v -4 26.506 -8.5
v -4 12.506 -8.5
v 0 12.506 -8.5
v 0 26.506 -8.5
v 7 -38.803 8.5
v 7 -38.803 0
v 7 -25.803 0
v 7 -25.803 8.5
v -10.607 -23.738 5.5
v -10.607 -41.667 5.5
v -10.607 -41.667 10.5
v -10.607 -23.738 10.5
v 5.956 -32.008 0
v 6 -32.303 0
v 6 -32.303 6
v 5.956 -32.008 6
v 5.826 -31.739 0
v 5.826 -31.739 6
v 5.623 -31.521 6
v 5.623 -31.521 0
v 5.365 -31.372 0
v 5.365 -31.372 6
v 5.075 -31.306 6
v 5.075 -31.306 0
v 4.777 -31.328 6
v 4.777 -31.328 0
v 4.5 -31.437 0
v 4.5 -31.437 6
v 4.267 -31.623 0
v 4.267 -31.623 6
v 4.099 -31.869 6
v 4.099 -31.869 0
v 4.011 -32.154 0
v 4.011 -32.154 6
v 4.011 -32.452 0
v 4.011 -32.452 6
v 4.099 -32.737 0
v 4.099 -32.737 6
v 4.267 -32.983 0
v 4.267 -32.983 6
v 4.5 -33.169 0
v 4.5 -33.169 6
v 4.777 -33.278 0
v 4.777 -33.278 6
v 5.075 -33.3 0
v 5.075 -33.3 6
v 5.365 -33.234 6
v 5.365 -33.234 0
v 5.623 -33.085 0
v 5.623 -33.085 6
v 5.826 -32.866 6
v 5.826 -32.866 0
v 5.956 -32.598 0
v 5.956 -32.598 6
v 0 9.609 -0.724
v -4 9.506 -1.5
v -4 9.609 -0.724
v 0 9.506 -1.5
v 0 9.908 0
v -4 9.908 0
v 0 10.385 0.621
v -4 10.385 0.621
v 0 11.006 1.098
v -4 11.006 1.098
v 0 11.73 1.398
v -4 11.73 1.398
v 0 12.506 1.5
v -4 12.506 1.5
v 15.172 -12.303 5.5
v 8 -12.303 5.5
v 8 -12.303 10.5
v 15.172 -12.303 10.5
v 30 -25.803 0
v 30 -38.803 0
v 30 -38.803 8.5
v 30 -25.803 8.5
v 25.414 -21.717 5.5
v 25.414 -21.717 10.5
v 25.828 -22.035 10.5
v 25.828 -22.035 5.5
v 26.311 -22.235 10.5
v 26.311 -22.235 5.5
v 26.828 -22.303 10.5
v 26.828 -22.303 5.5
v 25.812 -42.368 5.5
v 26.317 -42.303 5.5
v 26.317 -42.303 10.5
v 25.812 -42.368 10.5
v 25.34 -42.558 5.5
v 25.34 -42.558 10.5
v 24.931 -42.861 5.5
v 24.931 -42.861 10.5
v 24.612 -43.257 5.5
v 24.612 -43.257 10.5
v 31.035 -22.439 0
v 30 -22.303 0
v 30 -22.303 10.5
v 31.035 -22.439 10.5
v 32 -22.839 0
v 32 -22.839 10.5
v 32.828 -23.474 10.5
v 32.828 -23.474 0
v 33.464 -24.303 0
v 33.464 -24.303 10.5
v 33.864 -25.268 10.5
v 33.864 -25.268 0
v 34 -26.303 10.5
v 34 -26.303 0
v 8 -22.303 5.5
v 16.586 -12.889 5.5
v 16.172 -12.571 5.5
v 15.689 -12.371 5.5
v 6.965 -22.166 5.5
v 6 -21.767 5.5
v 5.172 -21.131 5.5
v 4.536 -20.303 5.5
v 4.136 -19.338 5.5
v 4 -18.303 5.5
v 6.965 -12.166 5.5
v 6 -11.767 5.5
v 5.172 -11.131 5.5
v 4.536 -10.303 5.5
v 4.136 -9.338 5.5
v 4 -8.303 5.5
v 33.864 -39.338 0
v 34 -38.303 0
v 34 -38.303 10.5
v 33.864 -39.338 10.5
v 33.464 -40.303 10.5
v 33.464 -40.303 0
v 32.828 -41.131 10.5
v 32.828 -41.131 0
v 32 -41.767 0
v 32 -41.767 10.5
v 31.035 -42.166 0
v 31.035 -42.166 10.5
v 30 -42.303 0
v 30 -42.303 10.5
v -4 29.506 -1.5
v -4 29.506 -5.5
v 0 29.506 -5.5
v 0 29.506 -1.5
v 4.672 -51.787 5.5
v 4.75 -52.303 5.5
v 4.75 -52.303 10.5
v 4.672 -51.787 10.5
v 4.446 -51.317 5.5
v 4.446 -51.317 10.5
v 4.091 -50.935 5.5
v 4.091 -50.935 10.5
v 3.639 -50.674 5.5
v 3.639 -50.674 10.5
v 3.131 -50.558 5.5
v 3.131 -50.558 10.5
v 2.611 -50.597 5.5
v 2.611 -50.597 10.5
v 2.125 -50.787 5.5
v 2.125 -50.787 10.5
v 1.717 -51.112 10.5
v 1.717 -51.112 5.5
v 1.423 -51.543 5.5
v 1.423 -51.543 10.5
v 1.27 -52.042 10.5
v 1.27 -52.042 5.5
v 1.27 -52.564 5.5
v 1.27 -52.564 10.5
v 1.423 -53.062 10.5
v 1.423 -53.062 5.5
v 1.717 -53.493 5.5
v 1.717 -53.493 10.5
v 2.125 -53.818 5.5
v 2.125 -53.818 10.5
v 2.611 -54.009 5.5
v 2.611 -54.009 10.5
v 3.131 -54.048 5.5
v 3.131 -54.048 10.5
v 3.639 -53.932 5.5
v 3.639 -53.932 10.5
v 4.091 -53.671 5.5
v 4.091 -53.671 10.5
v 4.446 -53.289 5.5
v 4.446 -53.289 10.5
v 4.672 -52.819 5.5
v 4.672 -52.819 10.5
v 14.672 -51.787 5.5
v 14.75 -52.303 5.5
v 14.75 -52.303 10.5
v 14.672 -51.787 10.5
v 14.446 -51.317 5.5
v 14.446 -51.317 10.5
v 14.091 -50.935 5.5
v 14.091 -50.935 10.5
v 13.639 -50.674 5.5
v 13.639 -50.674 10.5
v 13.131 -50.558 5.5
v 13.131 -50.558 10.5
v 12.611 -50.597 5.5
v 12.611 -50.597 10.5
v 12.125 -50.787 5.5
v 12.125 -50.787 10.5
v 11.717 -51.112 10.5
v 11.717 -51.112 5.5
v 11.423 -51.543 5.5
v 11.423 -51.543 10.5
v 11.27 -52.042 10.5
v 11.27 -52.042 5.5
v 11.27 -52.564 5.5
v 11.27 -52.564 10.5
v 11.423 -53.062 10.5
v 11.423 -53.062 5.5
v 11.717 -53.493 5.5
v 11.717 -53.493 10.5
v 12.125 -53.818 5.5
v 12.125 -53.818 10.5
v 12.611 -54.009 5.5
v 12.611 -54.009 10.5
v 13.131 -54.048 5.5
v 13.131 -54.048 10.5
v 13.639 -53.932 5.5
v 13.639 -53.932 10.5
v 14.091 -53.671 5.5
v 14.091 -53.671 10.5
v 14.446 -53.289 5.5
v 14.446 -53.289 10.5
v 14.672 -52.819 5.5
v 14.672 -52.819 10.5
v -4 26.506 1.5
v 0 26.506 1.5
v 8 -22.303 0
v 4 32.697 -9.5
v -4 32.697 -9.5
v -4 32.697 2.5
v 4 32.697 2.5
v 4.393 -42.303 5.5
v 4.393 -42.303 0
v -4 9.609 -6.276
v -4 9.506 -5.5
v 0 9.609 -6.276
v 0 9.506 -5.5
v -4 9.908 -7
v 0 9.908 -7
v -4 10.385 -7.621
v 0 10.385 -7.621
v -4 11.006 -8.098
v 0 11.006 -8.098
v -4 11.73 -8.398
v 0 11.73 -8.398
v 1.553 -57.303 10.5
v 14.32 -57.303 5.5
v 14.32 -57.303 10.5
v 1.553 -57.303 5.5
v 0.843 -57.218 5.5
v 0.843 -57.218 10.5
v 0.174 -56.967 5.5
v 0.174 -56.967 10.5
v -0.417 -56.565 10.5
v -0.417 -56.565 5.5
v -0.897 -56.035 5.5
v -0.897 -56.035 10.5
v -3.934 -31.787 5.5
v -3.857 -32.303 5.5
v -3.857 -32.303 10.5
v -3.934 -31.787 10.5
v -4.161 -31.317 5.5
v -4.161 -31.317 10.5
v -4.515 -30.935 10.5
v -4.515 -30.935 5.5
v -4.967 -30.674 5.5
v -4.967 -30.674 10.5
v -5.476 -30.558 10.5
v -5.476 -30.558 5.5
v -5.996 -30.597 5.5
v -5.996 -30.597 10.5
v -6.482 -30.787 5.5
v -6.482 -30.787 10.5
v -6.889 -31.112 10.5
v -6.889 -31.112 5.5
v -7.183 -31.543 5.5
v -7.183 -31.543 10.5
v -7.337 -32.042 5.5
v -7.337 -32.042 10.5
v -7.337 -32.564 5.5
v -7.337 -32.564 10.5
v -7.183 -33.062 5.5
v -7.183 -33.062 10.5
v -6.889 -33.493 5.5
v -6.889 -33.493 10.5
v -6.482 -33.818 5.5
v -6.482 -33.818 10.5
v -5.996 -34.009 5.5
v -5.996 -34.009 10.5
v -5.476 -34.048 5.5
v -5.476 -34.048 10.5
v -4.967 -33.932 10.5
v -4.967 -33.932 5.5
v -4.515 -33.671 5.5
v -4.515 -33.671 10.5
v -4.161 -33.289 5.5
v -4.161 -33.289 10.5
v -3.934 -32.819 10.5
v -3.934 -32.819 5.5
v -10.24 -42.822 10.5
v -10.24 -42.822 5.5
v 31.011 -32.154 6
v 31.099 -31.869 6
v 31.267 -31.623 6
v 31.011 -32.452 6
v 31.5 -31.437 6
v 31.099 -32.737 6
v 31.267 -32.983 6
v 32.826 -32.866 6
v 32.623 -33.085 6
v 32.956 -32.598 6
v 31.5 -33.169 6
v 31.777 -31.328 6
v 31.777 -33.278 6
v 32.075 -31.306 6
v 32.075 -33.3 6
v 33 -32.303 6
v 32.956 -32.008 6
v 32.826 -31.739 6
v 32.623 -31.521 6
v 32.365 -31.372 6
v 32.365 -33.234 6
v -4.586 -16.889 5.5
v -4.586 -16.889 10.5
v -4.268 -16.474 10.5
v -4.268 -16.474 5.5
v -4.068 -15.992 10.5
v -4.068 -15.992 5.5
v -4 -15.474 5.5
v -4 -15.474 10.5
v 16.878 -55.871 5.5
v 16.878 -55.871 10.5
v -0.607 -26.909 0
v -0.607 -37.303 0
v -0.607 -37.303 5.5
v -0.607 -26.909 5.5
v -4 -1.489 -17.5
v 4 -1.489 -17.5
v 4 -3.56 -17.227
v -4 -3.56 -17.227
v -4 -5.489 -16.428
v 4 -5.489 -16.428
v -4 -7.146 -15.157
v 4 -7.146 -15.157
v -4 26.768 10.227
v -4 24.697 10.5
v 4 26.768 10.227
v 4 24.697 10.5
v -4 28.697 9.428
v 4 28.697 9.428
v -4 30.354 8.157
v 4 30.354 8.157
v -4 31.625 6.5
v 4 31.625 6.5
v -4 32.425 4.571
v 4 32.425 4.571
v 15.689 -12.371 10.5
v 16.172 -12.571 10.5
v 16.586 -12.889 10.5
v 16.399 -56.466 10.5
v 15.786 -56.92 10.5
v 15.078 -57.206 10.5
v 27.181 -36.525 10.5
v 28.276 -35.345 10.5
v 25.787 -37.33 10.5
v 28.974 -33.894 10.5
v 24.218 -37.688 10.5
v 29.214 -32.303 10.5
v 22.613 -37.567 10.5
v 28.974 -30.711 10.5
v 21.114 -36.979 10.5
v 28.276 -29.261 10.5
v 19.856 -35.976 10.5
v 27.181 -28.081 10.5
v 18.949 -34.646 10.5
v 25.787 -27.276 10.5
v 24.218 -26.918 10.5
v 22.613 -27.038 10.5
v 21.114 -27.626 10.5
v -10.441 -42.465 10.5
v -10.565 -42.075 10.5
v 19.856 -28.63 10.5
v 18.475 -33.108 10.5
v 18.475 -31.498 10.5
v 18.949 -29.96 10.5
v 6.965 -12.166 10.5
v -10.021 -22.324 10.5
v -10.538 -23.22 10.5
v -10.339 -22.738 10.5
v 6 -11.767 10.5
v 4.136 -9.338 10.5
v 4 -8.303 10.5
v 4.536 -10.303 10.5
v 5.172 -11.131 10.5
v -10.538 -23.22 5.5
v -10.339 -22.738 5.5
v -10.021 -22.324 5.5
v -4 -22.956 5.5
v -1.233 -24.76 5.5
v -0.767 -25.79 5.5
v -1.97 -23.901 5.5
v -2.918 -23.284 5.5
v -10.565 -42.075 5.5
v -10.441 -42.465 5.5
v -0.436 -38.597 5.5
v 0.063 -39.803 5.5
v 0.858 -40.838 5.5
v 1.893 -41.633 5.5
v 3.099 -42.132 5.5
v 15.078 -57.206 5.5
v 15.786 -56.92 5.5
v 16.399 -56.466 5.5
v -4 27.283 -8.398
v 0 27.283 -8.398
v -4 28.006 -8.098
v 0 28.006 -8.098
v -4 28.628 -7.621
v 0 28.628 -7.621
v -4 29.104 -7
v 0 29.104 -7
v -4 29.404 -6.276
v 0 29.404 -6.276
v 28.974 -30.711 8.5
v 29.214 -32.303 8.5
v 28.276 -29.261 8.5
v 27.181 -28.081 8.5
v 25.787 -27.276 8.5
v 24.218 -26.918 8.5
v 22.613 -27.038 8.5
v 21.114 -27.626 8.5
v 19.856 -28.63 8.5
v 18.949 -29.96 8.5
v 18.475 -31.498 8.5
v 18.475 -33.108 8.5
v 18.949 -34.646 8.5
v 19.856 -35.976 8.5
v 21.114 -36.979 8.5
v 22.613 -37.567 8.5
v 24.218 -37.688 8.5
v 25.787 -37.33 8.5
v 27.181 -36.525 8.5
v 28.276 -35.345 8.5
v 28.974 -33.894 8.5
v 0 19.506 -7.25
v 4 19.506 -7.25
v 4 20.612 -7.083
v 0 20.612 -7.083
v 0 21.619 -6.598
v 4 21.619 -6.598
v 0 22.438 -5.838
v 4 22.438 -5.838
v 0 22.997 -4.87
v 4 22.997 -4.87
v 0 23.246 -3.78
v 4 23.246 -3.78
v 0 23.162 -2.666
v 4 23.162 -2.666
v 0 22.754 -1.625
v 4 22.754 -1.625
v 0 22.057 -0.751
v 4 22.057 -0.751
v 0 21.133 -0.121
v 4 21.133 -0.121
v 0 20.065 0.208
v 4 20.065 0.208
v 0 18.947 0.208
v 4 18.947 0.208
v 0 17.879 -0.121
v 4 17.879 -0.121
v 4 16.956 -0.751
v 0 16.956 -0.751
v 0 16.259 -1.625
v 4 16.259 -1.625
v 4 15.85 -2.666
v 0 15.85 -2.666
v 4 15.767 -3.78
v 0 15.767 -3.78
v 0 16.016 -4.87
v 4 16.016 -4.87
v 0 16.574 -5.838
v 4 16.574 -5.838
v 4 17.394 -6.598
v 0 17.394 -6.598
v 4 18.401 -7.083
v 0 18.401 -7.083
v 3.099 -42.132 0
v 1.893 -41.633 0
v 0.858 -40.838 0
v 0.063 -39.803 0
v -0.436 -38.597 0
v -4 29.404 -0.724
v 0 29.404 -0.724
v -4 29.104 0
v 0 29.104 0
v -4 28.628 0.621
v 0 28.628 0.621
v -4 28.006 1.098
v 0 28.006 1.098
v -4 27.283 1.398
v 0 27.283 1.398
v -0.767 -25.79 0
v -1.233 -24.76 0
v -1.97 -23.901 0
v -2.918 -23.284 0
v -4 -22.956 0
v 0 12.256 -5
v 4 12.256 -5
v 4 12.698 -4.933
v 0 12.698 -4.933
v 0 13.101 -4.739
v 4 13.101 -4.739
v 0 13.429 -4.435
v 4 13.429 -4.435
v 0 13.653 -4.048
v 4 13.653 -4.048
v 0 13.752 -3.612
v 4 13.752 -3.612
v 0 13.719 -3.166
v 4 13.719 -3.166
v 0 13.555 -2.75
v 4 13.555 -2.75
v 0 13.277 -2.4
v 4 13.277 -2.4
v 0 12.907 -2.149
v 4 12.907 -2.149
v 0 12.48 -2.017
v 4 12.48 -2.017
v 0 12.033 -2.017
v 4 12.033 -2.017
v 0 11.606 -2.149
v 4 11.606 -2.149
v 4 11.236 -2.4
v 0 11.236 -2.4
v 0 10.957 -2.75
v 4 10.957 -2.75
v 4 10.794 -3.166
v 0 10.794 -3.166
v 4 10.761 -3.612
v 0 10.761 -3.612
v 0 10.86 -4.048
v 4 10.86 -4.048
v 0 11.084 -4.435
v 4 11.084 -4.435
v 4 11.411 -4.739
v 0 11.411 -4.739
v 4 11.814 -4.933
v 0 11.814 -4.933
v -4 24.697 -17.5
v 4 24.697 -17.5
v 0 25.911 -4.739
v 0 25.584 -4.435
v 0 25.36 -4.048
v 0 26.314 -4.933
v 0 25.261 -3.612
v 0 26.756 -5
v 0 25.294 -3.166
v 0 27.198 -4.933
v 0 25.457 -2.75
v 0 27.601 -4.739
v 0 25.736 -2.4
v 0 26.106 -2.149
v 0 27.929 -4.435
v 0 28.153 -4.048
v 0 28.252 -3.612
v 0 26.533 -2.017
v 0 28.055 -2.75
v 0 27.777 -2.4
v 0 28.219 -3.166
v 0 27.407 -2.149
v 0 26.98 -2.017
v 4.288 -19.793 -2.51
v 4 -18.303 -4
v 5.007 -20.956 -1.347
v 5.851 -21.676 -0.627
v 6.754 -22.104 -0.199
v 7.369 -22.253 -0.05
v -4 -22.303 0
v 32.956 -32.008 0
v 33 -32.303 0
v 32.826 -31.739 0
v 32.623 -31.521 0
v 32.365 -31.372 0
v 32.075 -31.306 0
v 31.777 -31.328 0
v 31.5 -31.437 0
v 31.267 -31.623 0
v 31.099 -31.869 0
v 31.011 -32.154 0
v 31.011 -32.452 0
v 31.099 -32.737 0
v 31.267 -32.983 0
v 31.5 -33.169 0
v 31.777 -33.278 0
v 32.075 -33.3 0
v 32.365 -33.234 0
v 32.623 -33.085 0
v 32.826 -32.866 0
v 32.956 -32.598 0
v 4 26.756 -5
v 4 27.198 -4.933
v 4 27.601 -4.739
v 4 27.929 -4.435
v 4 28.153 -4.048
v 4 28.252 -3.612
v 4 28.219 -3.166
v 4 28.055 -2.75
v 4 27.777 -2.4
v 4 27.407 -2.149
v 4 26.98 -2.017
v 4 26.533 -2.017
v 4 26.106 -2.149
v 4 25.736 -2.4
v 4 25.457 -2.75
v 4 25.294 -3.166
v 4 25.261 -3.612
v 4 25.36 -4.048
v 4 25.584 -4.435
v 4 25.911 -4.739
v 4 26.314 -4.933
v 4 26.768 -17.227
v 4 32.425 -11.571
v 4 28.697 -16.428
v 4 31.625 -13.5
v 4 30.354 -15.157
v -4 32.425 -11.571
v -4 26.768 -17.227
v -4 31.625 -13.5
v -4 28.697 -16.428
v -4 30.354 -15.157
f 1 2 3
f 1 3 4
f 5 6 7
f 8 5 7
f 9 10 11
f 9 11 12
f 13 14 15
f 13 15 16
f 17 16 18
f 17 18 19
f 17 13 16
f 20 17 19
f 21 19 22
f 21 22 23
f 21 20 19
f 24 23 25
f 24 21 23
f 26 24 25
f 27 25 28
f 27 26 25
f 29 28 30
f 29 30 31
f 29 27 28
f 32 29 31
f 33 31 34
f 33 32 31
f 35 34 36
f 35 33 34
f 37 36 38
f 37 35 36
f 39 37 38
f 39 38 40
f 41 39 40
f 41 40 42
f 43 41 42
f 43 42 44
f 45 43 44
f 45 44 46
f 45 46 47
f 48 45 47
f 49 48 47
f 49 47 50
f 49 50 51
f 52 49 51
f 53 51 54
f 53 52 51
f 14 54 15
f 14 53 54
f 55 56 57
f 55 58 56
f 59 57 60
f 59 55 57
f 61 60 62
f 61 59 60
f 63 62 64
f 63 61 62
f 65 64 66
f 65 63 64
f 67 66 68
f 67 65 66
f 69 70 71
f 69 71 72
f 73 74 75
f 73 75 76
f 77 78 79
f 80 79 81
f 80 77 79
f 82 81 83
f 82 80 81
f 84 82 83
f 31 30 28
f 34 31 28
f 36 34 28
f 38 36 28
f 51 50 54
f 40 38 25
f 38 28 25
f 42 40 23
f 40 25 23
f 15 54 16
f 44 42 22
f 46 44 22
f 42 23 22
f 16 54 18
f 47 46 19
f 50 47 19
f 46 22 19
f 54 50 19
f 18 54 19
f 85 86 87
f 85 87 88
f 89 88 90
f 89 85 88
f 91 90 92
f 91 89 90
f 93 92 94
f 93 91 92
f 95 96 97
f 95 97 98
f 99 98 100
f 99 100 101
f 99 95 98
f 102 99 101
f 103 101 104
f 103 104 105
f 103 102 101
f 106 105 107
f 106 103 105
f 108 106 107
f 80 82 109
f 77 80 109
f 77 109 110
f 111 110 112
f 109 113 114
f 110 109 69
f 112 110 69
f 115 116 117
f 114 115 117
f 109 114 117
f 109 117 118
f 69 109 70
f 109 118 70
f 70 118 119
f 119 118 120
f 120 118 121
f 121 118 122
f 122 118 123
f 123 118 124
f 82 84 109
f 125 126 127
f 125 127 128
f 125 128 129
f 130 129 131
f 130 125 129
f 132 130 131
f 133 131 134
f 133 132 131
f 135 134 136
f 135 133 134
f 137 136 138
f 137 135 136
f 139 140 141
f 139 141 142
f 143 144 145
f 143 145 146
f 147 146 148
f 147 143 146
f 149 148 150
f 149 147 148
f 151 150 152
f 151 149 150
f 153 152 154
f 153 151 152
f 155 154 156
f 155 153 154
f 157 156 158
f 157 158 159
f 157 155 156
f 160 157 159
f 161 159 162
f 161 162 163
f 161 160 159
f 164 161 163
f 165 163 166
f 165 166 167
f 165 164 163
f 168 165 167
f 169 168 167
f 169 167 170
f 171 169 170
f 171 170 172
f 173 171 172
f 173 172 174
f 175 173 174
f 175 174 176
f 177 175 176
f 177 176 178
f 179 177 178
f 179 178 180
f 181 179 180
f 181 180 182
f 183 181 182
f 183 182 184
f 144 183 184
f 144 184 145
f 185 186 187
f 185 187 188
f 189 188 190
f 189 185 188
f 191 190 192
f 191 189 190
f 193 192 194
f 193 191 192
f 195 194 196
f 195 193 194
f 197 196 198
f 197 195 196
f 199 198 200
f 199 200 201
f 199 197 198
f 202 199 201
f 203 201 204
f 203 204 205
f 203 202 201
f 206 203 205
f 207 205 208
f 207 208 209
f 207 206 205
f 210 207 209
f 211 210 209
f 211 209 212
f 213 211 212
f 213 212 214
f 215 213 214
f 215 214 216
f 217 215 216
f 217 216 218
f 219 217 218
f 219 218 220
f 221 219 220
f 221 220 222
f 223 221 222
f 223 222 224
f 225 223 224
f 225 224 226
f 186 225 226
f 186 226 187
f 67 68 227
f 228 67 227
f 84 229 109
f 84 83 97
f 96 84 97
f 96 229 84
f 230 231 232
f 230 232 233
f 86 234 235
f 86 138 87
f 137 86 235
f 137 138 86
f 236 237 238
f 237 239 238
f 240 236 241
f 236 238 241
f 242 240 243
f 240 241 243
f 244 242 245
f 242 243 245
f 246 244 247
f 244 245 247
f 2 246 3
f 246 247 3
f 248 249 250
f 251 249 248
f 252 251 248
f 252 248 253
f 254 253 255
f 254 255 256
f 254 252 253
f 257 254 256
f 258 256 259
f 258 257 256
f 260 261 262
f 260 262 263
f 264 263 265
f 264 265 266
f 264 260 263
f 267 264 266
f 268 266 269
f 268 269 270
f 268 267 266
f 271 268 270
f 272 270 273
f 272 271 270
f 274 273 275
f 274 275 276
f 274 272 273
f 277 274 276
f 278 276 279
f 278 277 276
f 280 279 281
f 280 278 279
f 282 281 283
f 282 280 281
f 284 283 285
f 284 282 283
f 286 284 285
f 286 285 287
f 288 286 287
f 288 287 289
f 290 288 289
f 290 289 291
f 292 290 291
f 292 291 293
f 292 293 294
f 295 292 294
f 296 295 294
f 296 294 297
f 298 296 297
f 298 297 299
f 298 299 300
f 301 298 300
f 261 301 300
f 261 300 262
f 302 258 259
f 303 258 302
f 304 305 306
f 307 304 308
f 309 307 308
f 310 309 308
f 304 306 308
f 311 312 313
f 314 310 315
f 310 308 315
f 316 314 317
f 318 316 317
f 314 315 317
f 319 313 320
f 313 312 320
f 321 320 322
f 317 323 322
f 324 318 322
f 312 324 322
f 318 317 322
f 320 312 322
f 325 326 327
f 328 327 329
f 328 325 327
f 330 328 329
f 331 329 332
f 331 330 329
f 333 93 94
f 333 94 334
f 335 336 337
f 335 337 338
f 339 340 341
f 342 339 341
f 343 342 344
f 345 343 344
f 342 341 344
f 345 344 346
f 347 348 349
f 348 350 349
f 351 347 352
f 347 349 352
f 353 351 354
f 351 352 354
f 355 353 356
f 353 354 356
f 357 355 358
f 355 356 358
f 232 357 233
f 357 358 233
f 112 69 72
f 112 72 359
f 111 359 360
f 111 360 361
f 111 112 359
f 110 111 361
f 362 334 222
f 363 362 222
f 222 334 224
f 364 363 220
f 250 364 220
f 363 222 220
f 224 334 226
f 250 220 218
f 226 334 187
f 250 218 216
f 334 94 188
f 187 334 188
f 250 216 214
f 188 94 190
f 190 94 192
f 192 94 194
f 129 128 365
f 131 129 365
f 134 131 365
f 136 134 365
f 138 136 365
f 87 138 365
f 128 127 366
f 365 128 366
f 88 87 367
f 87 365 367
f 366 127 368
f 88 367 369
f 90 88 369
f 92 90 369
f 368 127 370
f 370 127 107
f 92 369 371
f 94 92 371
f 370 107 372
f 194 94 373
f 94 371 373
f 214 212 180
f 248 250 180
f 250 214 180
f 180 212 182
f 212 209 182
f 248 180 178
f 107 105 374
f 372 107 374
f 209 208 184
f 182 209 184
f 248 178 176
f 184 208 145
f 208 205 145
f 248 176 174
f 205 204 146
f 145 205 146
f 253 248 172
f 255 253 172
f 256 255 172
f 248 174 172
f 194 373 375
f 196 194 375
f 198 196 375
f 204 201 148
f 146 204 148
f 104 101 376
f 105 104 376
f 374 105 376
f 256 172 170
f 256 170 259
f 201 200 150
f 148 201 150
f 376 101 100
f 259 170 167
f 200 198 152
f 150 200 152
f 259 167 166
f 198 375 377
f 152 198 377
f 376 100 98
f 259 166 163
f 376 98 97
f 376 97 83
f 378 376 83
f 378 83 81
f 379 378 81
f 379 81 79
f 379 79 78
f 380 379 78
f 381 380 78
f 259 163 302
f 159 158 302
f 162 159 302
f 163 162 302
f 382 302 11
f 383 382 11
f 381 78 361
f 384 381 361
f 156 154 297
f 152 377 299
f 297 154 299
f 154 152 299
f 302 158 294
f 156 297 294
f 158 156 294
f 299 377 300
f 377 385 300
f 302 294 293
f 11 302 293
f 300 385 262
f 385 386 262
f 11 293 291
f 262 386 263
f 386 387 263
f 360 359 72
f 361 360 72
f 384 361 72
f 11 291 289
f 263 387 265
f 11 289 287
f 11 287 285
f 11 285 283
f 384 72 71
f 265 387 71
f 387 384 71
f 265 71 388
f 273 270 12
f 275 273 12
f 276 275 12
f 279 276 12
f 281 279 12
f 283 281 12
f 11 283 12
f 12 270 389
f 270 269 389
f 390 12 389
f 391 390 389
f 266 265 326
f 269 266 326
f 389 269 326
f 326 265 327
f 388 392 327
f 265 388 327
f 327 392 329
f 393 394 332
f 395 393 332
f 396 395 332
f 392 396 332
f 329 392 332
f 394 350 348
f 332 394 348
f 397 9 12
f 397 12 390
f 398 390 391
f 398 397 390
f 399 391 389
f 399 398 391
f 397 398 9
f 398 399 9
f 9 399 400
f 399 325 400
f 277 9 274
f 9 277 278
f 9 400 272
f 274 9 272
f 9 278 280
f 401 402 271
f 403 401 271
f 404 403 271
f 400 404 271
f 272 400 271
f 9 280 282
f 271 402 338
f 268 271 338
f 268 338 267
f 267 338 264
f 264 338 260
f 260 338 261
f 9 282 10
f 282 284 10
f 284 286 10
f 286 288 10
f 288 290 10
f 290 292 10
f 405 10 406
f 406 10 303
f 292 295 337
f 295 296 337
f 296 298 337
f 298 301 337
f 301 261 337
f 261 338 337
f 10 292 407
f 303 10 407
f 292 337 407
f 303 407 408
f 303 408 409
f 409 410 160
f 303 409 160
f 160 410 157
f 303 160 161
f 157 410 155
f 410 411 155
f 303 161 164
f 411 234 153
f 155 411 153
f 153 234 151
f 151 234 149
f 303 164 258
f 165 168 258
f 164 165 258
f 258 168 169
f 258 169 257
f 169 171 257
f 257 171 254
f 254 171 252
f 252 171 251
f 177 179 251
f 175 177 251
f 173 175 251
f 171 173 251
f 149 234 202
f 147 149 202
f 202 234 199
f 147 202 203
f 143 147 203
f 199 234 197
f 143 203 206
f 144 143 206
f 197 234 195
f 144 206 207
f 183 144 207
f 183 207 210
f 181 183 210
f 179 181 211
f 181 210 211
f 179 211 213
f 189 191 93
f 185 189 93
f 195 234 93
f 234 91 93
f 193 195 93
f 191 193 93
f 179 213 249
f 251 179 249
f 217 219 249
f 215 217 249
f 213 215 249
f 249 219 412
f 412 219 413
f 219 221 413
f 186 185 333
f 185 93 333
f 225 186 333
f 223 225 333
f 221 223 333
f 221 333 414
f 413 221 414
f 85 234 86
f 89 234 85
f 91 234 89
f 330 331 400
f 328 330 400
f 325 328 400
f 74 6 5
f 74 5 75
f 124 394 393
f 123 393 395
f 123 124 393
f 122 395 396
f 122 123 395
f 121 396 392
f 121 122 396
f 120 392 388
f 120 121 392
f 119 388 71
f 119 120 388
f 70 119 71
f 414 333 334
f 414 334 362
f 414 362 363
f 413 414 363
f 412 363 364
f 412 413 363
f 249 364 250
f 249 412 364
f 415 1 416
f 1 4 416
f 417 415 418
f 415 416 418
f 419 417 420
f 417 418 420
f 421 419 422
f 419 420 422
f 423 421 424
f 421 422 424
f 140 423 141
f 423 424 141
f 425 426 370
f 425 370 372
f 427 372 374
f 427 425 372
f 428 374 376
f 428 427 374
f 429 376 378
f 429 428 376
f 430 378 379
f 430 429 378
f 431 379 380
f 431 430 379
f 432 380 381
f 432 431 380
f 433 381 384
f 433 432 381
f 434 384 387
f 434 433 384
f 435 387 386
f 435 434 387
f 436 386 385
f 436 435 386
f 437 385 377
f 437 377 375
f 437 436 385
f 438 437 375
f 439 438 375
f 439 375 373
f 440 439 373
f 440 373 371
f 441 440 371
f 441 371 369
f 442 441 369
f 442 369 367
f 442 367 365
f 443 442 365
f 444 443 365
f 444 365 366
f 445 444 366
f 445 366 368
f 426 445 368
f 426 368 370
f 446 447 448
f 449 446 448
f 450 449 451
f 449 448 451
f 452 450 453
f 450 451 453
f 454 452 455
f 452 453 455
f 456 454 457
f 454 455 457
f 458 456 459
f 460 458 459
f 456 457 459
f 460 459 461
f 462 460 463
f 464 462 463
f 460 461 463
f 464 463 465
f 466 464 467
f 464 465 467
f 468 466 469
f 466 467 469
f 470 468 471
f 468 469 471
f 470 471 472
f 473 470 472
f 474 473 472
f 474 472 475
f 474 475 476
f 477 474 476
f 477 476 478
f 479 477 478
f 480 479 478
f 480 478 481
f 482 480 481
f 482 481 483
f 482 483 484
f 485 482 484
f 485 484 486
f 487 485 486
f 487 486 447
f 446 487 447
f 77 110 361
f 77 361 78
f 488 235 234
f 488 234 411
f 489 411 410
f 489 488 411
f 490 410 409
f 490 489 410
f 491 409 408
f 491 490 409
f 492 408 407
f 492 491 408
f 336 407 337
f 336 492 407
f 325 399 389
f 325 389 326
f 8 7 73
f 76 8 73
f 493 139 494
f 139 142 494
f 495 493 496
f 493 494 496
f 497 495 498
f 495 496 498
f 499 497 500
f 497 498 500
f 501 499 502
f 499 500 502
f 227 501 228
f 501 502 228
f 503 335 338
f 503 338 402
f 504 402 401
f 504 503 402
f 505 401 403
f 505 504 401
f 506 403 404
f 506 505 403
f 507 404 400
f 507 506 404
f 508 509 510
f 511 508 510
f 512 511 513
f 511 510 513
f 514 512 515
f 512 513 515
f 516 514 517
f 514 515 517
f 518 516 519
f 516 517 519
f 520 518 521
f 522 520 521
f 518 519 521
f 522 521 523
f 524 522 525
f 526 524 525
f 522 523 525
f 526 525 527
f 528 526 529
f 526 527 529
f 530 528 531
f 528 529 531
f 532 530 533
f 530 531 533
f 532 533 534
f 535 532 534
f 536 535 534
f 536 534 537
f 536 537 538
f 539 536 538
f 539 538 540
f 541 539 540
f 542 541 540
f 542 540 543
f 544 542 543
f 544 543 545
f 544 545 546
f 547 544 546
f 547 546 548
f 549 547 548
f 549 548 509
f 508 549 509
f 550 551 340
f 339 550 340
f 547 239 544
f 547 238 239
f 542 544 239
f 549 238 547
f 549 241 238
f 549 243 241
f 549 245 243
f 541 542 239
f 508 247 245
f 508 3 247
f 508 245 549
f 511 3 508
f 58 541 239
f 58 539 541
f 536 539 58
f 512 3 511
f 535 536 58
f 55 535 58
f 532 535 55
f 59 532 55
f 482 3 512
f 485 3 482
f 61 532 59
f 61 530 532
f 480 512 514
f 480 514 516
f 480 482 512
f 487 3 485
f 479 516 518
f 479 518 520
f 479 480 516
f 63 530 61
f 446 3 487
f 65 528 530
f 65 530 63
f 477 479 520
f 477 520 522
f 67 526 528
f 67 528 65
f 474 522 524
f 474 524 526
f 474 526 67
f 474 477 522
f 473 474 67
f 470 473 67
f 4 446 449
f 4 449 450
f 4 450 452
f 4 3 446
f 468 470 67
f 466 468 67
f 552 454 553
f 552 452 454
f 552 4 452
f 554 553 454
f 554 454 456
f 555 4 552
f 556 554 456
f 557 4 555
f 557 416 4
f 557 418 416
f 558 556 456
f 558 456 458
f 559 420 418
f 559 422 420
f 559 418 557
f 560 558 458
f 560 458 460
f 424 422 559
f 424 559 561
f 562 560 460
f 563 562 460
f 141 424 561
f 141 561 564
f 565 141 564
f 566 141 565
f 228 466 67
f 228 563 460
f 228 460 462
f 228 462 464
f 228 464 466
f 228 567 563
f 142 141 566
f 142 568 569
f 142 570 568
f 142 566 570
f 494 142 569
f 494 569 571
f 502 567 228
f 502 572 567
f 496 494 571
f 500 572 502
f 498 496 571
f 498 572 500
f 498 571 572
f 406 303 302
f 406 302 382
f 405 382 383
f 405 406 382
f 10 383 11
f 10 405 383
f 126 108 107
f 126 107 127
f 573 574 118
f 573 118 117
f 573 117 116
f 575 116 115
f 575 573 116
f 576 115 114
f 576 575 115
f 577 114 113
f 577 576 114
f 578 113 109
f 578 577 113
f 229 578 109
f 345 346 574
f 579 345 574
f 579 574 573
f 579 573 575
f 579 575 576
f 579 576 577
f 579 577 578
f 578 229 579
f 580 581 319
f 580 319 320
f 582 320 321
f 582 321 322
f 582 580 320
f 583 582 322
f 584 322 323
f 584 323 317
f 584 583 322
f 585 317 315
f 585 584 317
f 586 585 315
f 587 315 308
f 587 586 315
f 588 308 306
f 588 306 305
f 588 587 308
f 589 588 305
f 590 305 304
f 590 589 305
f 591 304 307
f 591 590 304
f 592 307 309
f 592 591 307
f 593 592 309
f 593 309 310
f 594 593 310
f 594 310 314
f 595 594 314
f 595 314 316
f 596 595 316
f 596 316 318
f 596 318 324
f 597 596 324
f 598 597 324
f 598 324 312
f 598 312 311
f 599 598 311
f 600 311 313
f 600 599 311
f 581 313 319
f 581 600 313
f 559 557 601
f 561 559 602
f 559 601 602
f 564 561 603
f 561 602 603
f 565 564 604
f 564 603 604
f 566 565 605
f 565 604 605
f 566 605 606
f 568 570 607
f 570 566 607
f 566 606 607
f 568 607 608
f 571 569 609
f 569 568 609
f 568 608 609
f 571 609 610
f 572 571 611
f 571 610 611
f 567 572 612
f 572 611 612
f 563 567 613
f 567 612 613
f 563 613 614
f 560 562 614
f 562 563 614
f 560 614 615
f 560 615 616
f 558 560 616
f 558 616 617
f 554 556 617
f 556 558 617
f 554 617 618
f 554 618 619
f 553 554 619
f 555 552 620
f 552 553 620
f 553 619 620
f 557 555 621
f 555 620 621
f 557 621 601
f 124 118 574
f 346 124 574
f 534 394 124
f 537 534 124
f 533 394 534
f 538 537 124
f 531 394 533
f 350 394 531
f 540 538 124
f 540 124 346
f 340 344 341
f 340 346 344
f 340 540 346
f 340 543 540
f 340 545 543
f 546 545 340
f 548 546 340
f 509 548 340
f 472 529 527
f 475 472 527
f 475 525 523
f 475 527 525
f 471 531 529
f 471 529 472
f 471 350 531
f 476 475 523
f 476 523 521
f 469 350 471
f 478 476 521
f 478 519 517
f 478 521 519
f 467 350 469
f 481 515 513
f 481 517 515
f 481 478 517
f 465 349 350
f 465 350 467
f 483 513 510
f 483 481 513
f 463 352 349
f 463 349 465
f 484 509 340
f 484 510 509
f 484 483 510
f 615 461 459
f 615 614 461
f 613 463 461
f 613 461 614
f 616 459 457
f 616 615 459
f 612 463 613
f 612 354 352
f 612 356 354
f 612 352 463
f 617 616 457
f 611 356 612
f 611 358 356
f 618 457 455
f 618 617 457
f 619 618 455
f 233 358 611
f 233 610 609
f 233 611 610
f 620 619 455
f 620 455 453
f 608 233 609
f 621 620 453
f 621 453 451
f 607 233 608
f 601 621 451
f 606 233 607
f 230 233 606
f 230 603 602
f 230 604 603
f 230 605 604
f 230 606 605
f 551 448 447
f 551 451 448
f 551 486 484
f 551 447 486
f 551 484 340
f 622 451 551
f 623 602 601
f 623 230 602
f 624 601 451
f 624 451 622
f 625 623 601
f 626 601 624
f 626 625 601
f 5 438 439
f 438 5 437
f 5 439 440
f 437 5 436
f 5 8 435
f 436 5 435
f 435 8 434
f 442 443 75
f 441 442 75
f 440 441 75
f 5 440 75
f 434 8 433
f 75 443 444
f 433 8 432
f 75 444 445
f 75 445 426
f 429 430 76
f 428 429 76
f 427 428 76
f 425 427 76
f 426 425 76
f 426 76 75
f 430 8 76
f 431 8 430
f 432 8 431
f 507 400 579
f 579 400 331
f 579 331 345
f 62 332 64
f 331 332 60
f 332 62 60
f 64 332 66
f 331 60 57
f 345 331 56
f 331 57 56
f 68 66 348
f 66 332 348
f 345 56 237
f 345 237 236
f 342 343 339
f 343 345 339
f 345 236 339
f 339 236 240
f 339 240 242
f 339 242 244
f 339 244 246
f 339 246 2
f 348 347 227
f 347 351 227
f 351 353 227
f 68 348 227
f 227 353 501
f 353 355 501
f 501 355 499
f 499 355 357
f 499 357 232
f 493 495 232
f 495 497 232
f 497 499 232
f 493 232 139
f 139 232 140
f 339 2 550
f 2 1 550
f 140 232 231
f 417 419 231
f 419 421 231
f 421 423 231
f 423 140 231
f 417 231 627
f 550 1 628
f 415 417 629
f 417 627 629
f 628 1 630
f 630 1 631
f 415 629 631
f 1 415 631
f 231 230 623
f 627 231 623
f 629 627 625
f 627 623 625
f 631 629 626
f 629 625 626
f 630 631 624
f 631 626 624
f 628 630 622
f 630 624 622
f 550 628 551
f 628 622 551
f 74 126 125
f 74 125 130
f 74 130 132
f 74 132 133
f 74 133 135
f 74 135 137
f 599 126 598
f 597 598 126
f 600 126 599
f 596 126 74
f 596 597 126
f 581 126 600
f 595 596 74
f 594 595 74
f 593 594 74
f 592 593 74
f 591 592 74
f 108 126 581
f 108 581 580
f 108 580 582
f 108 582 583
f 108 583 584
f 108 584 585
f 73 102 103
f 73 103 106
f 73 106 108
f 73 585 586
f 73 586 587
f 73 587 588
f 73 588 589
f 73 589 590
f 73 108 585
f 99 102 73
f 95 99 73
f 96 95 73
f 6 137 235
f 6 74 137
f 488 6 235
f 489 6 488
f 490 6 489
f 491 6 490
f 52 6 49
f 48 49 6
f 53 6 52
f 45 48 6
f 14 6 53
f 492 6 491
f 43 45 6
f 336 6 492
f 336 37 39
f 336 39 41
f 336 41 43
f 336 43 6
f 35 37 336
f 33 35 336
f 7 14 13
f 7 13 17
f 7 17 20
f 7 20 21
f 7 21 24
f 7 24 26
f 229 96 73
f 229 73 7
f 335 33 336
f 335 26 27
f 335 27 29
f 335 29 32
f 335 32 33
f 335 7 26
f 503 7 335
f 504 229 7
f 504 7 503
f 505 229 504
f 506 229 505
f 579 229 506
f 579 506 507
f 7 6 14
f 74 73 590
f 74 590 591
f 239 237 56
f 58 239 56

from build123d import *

# Parameters (mm, degrees)
IZIM1_R                     = 5.4
IZIM1_R_2                   = 1.75
Y_KSEKLIK_EKSTR_ZYON1_DEPTH = 10.5
IZIM3_W                     = 5.5
IZIM3_H                     = 14
KES_EKSTR_ZYON1_DEPTH       = 34.5
KES_EKSTR_ZYON2_DEPTH       = 34.5
KES_EKSTR_ZYON2_DEPTH_BACK  = 34.5
IZIM5_W                     = 6.606601718
IZIM5_H                     = 5.5
KES_EKSTR_ZYON4_DEPTH       = 50.5
KES_EKSTR_ZYON5_DEPTH       = 5.5
Y_KSEKLIK_EKSTR_ZYON2_DEPTH = 8
RADYUS2_R                   = 8
RADYUS7_R                   = 4
IZIM9_W                     = 23
IZIM9_H                     = 13
KES_EKSTR_ZYON6_DEPTH       = 8.5
IZIM10_R                    = 1
KES_EKSTR_ZYON7_DEPTH       = 6
KES_EKSTR_ZYON8_DEPTH       = 4
IZIM12_R                    = 1.3
IZIM12_R_2                  = 2.5
KES_EKSTR_ZYON9_DEPTH       = 8
IZIM13_R                    = 2.5
Y_KSEKLIK_EKSTR_ZYON4_DEPTH = 8
IZIM14_R                    = 3.75
IZIM14_R_2                  = 1.5
KES_EKSTR_ZYON10_DEPTH      = 8
IZIM15_W                    = 10
IZIM15_H                    = 20
IZIM15_R                    = 1.5
KES_EKSTR_ZYON11_DEPTH      = 4
RADYUS10_R                  = 3
RADYUS11_R                  = 3
RADYUS12_R                  = 3
RADYUS13_R                  = 3


with BuildPart() as part:
    # Çizim1 → Yükseklik-Ekstrüzyon1 (new body)
    with BuildSketch(Plane.XY):
        with BuildLine():
            ThreePointArc((-10.23959488, -42.821815771), (-10.512642946, -42.272926126), (-10.606601718, -41.667115232))
            Line((-10.606601718, -41.667115232), (-10.606601718, -23.737818565))
            ThreePointArc((-10.606601718, -23.737818565), (-10.454360783, -22.972451701), (-10.02081528, -22.323605003))
            Line((-10.02081528, -22.323605003), (-4.585786438, -16.888576161))
            ThreePointArc((-4.585786438, -16.888576161), (-4.152240935, -16.239729463), (-4, -15.474362598))
            Line((-4, -15.474362598), (-4, -12.302789723))
            Line((-4, -12.302789723), (-4, 32.697210277))
            Line((-4, 32.697210277), (4, 32.697210277))
            Line((4, 32.697210277), (4, -8.302789723))
            ThreePointArc((4, -8.302789723), (5.171572875, -11.131216848), (8, -12.302789723))
            Line((8, -12.302789723), (15.171572875, -12.302789723))
            ThreePointArc((15.171572875, -12.302789723), (15.93693974, -12.455030658), (16.585786438, -12.888576161))
            Line((16.585786438, -12.888576161), (25.414213562, -21.717003285))
            ThreePointArc((25.414213562, -21.717003285), (26.06306026, -22.150548788), (26.828427125, -22.302789723))
            Line((26.828427125, -22.302789723), (30, -22.302789723))
            ThreePointArc((30, -22.302789723), (32.828427125, -23.474362598), (34, -26.302789723))
            Line((34, -26.302789723), (34, -38.302789723))
            ThreePointArc((34, -38.302789723), (32.828427125, -41.131216848), (30, -42.302789723))
            Line((30, -42.302789723), (26.317150887, -42.302789723))
            ThreePointArc((26.317150887, -42.302789723), (25.340138032, -42.557669131), (24.612145635, -43.257343842))
            Line((24.612145635, -43.257343842), (16.877945687, -55.870958544))
            ThreePointArc((16.877945687, -55.870958544), (15.785957092, -56.920470611), (14.320437809, -57.302789723))
            Line((14.320437809, -57.302789723), (1.552914271, -57.302789723))
            ThreePointArc((1.552914271, -57.302789723), (0.17381174, -56.967011225), (-0.896575472, -56.03484053))
            Line((-0.896575472, -56.03484053), (-10.23959488, -42.821815771))
        make_face()
        with Locations((23.814213562, -32.302789723)):
            Circle(IZIM1_R, mode=Mode.SUBTRACT)
        with Locations((-5.606601718, -32.302789723)):
            Circle(IZIM1_R_2, mode=Mode.SUBTRACT)
        with Locations((13, -52.302789723)):
            Circle(IZIM1_R_2, mode=Mode.SUBTRACT)
        with Locations((3, -52.302789723)):
            Circle(IZIM1_R_2, mode=Mode.SUBTRACT)
    extrude(amount=Y_KSEKLIK_EKSTR_ZYON1_DEPTH)

    # Çizim3 → Kes-Ekstrüzyon1 (cut)
    with BuildSketch(Plane(origin=(4, 0, 0), x_dir=(0, 0, -1), z_dir=(1, 0, 0))):
        with Locations((-2.75, -15.302789723)):
            Rectangle(IZIM3_W, IZIM3_H)
    extrude(amount=KES_EKSTR_ZYON1_DEPTH, mode=Mode.SUBTRACT)

    # Çizim4 → Kes-Ekstrüzyon2 (cut, two sides)
    with BuildSketch(Plane(origin=(0, 0, 0), x_dir=(0, 0, -1), z_dir=(1, 0, 0))) as kes_ekstr_zyon2_sk:
        Polygon((-5.5, -42.821815771), (-5.5, -42.302789723), (0, -42.302789723), (0, -42.821815771), (0, -57.302789723), (-5.5, -57.302789723), align=None)
    extrude(amount=KES_EKSTR_ZYON2_DEPTH, mode=Mode.SUBTRACT)
    extrude(kes_ekstr_zyon2_sk.sketch, amount=-KES_EKSTR_ZYON2_DEPTH_BACK, mode=Mode.SUBTRACT)

    # Çizim5 → Kes-Ekstrüzyon4 (cut)
    with BuildSketch(Plane(origin=(0, 0, 0), x_dir=(1, 0, 0), z_dir=(0, 1, 0))):
        with Locations((-7.303300859, -2.75)):
            Rectangle(IZIM5_W, IZIM5_H)
    extrude(amount=-KES_EKSTR_ZYON4_DEPTH, mode=Mode.SUBTRACT)

    # Çizim7 → Kes-Ekstrüzyon5 (cut)
    with BuildSketch(Plane.XY):
        with BuildLine():
            Line((-4.606601718, -22.909391441), (-10.606601718, -22.909391441))
            Line((-10.606601718, -22.909391441), (-12.80795169, -22.909391441))
            Line((-12.80795169, -22.909391441), (-12.80795169, -45.448338302))
            Line((-12.80795169, -45.448338302), (4.393398282, -45.448338302))
            Line((4.393398282, -45.448338302), (4.393398282, -42.302789723))
            ThreePointArc((4.393398282, -42.302789723), (0.857864376, -40.838323629), (-0.606601718, -37.302789723))
            Line((-0.606601718, -37.302789723), (-0.606601718, -26.909391441))
            ThreePointArc((-0.606601718, -26.909391441), (-1.778174593, -24.080964316), (-4.606601718, -22.909391441))
        make_face()
    extrude(amount=KES_EKSTR_ZYON5_DEPTH, mode=Mode.SUBTRACT)

    # Çizim8 → Yükseklik-Ekstrüzyon2 (add)
    with BuildSketch(Plane(origin=(4, 0, 0), x_dir=(0, 0, -1), z_dir=(1, 0, 0))):
        with BuildLine():
            Line((-10.5, 32.697210277), (9.5, 32.697210277))
            ThreePointArc((9.5, 32.697210277), (15.156854249, 30.354064527), (17.5, 24.697210277))
            Line((17.5, 24.697210277), (17.5, -1.336305369))
            Line((17.5, -1.336305369), (17.5, -1.489081224))
            ThreePointArc((17.5, -1.489081224), (16.89103626, -4.550548683), (15.156854249, -7.145935473))
            Line((15.156854249, -7.145935473), (0, -22.302789723))
            Line((0, -22.302789723), (-10.5, -22.302789723))
            Line((-10.5, -22.302789723), (-10.5, 32.697210277))
        make_face()
    extrude(amount=-Y_KSEKLIK_EKSTR_ZYON2_DEPTH)

    # Radyus2
    radyus2_edges = [part.edges().sort_by_distance(p)[0] for p in [
        (0, 32.697210277, 10.5),
    ]]
    fillet(radyus2_edges, radius=RADYUS2_R)

    # Radyus7
    radyus7_edges = [part.edges().sort_by_distance(p)[0] for p in [
        (4, -22.302789723, 2.75),
    ]]
    fillet(radyus7_edges, radius=RADYUS7_R)

    # Çizim9 → Kes-Ekstrüzyon6 (cut)
    with BuildSketch(Plane.XY):
        with Locations((18.5, -32.302789723)):
            Rectangle(IZIM9_W, IZIM9_H)
    extrude(amount=KES_EKSTR_ZYON6_DEPTH, mode=Mode.SUBTRACT)

    # Çizim10 → Kes-Ekstrüzyon7 (cut)
    with BuildSketch(Plane.XY):
        with Locations((32, -32.302789723)):
            Circle(IZIM10_R)
        with Locations((5, -32.302789723)):
            Circle(IZIM10_R)
    extrude(amount=KES_EKSTR_ZYON7_DEPTH, mode=Mode.SUBTRACT)

    # Çizim11 → Kes-Ekstrüzyon8 (cut)
    with BuildSketch(Plane.ZY.offset(4)):
        with BuildLine():
            Line((-6.5, 14.197210277), (-6.5, 23.197210277))
            ThreePointArc((-6.5, 23.197210277), (-3.5, 26.197210277), (-0.5, 23.197210277))
            Line((-0.5, 23.197210277), (-0.5, 14.197210277))
            ThreePointArc((-0.5, 14.197210277), (-3.5, 11.197210277), (-6.5, 14.197210277))
        make_face()
    extrude(amount=-KES_EKSTR_ZYON8_DEPTH, mode=Mode.SUBTRACT)

    # Çizim12 → Kes-Ekstrüzyon9 (cut)
    with BuildSketch(Plane.ZY.offset(4)):
        with Locations((-3.5, 23.197210277)):
            Circle(IZIM12_R)
        with Locations((-3.5, 14.197210277)):
            Circle(IZIM12_R)
        with Locations((-3.5, 18.697210277)):
            Circle(IZIM12_R_2)
    extrude(amount=-KES_EKSTR_ZYON9_DEPTH, mode=Mode.SUBTRACT)

    # Çizim13 → Yükseklik-Ekstrüzyon4 (add)
    with BuildSketch(Plane(origin=(4, 0, 0), x_dir=(0, 0, -1), z_dir=(1, 0, 0))):
        Polygon((-4.189470597, 27.846393302), (11.202467705, 28.228364897), (11.683763176, 8.834068822), (-4.189470597, 8.440153234), align=None)
        with Locations((3.5, 18.697210277)):
            Circle(IZIM13_R, mode=Mode.SUBTRACT)
    extrude(amount=-Y_KSEKLIK_EKSTR_ZYON4_DEPTH)

    # Çizim14 → Kes-Ekstrüzyon10 (cut)
    with BuildSketch(Plane(origin=(4, 0, 0), x_dir=(0, 0, -1), z_dir=(1, 0, 0))):
        with Locations((3.5, 19.50634608)):
            Circle(IZIM14_R)
        with Locations((3.5, 12.25634608)):
            Circle(IZIM14_R_2)
        with Locations((3.5, 26.75634608)):
            Circle(IZIM14_R_2)
    extrude(amount=-KES_EKSTR_ZYON10_DEPTH, mode=Mode.SUBTRACT)

    # Çizim15 → Kes-Ekstrüzyon11 (cut)
    with BuildSketch(Plane.ZY.offset(4)):
        with Locations((-3.5, 19.50634608)):
            Rectangle(IZIM15_W, IZIM15_H)
        with Locations((-3.5, 26.75634608)):
            Circle(IZIM15_R, mode=Mode.SUBTRACT)
    extrude(amount=-KES_EKSTR_ZYON11_DEPTH, mode=Mode.SUBTRACT)

    # Radyus10
    radyus10_edges = [part.edges().sort_by_distance(p)[0] for p in [
        (-2, 29.50634608, 1.5),
    ]]
    fillet(radyus10_edges, radius=RADYUS10_R)

    # Radyus11
    radyus11_edges = [part.edges().sort_by_distance(p)[0] for p in [
        (-2, 9.50634608, -8.5),
    ]]
    fillet(radyus11_edges, radius=RADYUS11_R)

    # Radyus12
    radyus12_edges = [part.edges().sort_by_distance(p)[0] for p in [
        (-2, 29.50634608, -8.5),
    ]]
    fillet(radyus12_edges, radius=RADYUS12_R)

    # Radyus13
    radyus13_edges = [part.edges().sort_by_distance(p)[0] for p in [
        (-2, 9.50634608, 1.5),
    ]]
    fillet(radyus13_edges, radius=RADYUS13_R)


solid = part.part
